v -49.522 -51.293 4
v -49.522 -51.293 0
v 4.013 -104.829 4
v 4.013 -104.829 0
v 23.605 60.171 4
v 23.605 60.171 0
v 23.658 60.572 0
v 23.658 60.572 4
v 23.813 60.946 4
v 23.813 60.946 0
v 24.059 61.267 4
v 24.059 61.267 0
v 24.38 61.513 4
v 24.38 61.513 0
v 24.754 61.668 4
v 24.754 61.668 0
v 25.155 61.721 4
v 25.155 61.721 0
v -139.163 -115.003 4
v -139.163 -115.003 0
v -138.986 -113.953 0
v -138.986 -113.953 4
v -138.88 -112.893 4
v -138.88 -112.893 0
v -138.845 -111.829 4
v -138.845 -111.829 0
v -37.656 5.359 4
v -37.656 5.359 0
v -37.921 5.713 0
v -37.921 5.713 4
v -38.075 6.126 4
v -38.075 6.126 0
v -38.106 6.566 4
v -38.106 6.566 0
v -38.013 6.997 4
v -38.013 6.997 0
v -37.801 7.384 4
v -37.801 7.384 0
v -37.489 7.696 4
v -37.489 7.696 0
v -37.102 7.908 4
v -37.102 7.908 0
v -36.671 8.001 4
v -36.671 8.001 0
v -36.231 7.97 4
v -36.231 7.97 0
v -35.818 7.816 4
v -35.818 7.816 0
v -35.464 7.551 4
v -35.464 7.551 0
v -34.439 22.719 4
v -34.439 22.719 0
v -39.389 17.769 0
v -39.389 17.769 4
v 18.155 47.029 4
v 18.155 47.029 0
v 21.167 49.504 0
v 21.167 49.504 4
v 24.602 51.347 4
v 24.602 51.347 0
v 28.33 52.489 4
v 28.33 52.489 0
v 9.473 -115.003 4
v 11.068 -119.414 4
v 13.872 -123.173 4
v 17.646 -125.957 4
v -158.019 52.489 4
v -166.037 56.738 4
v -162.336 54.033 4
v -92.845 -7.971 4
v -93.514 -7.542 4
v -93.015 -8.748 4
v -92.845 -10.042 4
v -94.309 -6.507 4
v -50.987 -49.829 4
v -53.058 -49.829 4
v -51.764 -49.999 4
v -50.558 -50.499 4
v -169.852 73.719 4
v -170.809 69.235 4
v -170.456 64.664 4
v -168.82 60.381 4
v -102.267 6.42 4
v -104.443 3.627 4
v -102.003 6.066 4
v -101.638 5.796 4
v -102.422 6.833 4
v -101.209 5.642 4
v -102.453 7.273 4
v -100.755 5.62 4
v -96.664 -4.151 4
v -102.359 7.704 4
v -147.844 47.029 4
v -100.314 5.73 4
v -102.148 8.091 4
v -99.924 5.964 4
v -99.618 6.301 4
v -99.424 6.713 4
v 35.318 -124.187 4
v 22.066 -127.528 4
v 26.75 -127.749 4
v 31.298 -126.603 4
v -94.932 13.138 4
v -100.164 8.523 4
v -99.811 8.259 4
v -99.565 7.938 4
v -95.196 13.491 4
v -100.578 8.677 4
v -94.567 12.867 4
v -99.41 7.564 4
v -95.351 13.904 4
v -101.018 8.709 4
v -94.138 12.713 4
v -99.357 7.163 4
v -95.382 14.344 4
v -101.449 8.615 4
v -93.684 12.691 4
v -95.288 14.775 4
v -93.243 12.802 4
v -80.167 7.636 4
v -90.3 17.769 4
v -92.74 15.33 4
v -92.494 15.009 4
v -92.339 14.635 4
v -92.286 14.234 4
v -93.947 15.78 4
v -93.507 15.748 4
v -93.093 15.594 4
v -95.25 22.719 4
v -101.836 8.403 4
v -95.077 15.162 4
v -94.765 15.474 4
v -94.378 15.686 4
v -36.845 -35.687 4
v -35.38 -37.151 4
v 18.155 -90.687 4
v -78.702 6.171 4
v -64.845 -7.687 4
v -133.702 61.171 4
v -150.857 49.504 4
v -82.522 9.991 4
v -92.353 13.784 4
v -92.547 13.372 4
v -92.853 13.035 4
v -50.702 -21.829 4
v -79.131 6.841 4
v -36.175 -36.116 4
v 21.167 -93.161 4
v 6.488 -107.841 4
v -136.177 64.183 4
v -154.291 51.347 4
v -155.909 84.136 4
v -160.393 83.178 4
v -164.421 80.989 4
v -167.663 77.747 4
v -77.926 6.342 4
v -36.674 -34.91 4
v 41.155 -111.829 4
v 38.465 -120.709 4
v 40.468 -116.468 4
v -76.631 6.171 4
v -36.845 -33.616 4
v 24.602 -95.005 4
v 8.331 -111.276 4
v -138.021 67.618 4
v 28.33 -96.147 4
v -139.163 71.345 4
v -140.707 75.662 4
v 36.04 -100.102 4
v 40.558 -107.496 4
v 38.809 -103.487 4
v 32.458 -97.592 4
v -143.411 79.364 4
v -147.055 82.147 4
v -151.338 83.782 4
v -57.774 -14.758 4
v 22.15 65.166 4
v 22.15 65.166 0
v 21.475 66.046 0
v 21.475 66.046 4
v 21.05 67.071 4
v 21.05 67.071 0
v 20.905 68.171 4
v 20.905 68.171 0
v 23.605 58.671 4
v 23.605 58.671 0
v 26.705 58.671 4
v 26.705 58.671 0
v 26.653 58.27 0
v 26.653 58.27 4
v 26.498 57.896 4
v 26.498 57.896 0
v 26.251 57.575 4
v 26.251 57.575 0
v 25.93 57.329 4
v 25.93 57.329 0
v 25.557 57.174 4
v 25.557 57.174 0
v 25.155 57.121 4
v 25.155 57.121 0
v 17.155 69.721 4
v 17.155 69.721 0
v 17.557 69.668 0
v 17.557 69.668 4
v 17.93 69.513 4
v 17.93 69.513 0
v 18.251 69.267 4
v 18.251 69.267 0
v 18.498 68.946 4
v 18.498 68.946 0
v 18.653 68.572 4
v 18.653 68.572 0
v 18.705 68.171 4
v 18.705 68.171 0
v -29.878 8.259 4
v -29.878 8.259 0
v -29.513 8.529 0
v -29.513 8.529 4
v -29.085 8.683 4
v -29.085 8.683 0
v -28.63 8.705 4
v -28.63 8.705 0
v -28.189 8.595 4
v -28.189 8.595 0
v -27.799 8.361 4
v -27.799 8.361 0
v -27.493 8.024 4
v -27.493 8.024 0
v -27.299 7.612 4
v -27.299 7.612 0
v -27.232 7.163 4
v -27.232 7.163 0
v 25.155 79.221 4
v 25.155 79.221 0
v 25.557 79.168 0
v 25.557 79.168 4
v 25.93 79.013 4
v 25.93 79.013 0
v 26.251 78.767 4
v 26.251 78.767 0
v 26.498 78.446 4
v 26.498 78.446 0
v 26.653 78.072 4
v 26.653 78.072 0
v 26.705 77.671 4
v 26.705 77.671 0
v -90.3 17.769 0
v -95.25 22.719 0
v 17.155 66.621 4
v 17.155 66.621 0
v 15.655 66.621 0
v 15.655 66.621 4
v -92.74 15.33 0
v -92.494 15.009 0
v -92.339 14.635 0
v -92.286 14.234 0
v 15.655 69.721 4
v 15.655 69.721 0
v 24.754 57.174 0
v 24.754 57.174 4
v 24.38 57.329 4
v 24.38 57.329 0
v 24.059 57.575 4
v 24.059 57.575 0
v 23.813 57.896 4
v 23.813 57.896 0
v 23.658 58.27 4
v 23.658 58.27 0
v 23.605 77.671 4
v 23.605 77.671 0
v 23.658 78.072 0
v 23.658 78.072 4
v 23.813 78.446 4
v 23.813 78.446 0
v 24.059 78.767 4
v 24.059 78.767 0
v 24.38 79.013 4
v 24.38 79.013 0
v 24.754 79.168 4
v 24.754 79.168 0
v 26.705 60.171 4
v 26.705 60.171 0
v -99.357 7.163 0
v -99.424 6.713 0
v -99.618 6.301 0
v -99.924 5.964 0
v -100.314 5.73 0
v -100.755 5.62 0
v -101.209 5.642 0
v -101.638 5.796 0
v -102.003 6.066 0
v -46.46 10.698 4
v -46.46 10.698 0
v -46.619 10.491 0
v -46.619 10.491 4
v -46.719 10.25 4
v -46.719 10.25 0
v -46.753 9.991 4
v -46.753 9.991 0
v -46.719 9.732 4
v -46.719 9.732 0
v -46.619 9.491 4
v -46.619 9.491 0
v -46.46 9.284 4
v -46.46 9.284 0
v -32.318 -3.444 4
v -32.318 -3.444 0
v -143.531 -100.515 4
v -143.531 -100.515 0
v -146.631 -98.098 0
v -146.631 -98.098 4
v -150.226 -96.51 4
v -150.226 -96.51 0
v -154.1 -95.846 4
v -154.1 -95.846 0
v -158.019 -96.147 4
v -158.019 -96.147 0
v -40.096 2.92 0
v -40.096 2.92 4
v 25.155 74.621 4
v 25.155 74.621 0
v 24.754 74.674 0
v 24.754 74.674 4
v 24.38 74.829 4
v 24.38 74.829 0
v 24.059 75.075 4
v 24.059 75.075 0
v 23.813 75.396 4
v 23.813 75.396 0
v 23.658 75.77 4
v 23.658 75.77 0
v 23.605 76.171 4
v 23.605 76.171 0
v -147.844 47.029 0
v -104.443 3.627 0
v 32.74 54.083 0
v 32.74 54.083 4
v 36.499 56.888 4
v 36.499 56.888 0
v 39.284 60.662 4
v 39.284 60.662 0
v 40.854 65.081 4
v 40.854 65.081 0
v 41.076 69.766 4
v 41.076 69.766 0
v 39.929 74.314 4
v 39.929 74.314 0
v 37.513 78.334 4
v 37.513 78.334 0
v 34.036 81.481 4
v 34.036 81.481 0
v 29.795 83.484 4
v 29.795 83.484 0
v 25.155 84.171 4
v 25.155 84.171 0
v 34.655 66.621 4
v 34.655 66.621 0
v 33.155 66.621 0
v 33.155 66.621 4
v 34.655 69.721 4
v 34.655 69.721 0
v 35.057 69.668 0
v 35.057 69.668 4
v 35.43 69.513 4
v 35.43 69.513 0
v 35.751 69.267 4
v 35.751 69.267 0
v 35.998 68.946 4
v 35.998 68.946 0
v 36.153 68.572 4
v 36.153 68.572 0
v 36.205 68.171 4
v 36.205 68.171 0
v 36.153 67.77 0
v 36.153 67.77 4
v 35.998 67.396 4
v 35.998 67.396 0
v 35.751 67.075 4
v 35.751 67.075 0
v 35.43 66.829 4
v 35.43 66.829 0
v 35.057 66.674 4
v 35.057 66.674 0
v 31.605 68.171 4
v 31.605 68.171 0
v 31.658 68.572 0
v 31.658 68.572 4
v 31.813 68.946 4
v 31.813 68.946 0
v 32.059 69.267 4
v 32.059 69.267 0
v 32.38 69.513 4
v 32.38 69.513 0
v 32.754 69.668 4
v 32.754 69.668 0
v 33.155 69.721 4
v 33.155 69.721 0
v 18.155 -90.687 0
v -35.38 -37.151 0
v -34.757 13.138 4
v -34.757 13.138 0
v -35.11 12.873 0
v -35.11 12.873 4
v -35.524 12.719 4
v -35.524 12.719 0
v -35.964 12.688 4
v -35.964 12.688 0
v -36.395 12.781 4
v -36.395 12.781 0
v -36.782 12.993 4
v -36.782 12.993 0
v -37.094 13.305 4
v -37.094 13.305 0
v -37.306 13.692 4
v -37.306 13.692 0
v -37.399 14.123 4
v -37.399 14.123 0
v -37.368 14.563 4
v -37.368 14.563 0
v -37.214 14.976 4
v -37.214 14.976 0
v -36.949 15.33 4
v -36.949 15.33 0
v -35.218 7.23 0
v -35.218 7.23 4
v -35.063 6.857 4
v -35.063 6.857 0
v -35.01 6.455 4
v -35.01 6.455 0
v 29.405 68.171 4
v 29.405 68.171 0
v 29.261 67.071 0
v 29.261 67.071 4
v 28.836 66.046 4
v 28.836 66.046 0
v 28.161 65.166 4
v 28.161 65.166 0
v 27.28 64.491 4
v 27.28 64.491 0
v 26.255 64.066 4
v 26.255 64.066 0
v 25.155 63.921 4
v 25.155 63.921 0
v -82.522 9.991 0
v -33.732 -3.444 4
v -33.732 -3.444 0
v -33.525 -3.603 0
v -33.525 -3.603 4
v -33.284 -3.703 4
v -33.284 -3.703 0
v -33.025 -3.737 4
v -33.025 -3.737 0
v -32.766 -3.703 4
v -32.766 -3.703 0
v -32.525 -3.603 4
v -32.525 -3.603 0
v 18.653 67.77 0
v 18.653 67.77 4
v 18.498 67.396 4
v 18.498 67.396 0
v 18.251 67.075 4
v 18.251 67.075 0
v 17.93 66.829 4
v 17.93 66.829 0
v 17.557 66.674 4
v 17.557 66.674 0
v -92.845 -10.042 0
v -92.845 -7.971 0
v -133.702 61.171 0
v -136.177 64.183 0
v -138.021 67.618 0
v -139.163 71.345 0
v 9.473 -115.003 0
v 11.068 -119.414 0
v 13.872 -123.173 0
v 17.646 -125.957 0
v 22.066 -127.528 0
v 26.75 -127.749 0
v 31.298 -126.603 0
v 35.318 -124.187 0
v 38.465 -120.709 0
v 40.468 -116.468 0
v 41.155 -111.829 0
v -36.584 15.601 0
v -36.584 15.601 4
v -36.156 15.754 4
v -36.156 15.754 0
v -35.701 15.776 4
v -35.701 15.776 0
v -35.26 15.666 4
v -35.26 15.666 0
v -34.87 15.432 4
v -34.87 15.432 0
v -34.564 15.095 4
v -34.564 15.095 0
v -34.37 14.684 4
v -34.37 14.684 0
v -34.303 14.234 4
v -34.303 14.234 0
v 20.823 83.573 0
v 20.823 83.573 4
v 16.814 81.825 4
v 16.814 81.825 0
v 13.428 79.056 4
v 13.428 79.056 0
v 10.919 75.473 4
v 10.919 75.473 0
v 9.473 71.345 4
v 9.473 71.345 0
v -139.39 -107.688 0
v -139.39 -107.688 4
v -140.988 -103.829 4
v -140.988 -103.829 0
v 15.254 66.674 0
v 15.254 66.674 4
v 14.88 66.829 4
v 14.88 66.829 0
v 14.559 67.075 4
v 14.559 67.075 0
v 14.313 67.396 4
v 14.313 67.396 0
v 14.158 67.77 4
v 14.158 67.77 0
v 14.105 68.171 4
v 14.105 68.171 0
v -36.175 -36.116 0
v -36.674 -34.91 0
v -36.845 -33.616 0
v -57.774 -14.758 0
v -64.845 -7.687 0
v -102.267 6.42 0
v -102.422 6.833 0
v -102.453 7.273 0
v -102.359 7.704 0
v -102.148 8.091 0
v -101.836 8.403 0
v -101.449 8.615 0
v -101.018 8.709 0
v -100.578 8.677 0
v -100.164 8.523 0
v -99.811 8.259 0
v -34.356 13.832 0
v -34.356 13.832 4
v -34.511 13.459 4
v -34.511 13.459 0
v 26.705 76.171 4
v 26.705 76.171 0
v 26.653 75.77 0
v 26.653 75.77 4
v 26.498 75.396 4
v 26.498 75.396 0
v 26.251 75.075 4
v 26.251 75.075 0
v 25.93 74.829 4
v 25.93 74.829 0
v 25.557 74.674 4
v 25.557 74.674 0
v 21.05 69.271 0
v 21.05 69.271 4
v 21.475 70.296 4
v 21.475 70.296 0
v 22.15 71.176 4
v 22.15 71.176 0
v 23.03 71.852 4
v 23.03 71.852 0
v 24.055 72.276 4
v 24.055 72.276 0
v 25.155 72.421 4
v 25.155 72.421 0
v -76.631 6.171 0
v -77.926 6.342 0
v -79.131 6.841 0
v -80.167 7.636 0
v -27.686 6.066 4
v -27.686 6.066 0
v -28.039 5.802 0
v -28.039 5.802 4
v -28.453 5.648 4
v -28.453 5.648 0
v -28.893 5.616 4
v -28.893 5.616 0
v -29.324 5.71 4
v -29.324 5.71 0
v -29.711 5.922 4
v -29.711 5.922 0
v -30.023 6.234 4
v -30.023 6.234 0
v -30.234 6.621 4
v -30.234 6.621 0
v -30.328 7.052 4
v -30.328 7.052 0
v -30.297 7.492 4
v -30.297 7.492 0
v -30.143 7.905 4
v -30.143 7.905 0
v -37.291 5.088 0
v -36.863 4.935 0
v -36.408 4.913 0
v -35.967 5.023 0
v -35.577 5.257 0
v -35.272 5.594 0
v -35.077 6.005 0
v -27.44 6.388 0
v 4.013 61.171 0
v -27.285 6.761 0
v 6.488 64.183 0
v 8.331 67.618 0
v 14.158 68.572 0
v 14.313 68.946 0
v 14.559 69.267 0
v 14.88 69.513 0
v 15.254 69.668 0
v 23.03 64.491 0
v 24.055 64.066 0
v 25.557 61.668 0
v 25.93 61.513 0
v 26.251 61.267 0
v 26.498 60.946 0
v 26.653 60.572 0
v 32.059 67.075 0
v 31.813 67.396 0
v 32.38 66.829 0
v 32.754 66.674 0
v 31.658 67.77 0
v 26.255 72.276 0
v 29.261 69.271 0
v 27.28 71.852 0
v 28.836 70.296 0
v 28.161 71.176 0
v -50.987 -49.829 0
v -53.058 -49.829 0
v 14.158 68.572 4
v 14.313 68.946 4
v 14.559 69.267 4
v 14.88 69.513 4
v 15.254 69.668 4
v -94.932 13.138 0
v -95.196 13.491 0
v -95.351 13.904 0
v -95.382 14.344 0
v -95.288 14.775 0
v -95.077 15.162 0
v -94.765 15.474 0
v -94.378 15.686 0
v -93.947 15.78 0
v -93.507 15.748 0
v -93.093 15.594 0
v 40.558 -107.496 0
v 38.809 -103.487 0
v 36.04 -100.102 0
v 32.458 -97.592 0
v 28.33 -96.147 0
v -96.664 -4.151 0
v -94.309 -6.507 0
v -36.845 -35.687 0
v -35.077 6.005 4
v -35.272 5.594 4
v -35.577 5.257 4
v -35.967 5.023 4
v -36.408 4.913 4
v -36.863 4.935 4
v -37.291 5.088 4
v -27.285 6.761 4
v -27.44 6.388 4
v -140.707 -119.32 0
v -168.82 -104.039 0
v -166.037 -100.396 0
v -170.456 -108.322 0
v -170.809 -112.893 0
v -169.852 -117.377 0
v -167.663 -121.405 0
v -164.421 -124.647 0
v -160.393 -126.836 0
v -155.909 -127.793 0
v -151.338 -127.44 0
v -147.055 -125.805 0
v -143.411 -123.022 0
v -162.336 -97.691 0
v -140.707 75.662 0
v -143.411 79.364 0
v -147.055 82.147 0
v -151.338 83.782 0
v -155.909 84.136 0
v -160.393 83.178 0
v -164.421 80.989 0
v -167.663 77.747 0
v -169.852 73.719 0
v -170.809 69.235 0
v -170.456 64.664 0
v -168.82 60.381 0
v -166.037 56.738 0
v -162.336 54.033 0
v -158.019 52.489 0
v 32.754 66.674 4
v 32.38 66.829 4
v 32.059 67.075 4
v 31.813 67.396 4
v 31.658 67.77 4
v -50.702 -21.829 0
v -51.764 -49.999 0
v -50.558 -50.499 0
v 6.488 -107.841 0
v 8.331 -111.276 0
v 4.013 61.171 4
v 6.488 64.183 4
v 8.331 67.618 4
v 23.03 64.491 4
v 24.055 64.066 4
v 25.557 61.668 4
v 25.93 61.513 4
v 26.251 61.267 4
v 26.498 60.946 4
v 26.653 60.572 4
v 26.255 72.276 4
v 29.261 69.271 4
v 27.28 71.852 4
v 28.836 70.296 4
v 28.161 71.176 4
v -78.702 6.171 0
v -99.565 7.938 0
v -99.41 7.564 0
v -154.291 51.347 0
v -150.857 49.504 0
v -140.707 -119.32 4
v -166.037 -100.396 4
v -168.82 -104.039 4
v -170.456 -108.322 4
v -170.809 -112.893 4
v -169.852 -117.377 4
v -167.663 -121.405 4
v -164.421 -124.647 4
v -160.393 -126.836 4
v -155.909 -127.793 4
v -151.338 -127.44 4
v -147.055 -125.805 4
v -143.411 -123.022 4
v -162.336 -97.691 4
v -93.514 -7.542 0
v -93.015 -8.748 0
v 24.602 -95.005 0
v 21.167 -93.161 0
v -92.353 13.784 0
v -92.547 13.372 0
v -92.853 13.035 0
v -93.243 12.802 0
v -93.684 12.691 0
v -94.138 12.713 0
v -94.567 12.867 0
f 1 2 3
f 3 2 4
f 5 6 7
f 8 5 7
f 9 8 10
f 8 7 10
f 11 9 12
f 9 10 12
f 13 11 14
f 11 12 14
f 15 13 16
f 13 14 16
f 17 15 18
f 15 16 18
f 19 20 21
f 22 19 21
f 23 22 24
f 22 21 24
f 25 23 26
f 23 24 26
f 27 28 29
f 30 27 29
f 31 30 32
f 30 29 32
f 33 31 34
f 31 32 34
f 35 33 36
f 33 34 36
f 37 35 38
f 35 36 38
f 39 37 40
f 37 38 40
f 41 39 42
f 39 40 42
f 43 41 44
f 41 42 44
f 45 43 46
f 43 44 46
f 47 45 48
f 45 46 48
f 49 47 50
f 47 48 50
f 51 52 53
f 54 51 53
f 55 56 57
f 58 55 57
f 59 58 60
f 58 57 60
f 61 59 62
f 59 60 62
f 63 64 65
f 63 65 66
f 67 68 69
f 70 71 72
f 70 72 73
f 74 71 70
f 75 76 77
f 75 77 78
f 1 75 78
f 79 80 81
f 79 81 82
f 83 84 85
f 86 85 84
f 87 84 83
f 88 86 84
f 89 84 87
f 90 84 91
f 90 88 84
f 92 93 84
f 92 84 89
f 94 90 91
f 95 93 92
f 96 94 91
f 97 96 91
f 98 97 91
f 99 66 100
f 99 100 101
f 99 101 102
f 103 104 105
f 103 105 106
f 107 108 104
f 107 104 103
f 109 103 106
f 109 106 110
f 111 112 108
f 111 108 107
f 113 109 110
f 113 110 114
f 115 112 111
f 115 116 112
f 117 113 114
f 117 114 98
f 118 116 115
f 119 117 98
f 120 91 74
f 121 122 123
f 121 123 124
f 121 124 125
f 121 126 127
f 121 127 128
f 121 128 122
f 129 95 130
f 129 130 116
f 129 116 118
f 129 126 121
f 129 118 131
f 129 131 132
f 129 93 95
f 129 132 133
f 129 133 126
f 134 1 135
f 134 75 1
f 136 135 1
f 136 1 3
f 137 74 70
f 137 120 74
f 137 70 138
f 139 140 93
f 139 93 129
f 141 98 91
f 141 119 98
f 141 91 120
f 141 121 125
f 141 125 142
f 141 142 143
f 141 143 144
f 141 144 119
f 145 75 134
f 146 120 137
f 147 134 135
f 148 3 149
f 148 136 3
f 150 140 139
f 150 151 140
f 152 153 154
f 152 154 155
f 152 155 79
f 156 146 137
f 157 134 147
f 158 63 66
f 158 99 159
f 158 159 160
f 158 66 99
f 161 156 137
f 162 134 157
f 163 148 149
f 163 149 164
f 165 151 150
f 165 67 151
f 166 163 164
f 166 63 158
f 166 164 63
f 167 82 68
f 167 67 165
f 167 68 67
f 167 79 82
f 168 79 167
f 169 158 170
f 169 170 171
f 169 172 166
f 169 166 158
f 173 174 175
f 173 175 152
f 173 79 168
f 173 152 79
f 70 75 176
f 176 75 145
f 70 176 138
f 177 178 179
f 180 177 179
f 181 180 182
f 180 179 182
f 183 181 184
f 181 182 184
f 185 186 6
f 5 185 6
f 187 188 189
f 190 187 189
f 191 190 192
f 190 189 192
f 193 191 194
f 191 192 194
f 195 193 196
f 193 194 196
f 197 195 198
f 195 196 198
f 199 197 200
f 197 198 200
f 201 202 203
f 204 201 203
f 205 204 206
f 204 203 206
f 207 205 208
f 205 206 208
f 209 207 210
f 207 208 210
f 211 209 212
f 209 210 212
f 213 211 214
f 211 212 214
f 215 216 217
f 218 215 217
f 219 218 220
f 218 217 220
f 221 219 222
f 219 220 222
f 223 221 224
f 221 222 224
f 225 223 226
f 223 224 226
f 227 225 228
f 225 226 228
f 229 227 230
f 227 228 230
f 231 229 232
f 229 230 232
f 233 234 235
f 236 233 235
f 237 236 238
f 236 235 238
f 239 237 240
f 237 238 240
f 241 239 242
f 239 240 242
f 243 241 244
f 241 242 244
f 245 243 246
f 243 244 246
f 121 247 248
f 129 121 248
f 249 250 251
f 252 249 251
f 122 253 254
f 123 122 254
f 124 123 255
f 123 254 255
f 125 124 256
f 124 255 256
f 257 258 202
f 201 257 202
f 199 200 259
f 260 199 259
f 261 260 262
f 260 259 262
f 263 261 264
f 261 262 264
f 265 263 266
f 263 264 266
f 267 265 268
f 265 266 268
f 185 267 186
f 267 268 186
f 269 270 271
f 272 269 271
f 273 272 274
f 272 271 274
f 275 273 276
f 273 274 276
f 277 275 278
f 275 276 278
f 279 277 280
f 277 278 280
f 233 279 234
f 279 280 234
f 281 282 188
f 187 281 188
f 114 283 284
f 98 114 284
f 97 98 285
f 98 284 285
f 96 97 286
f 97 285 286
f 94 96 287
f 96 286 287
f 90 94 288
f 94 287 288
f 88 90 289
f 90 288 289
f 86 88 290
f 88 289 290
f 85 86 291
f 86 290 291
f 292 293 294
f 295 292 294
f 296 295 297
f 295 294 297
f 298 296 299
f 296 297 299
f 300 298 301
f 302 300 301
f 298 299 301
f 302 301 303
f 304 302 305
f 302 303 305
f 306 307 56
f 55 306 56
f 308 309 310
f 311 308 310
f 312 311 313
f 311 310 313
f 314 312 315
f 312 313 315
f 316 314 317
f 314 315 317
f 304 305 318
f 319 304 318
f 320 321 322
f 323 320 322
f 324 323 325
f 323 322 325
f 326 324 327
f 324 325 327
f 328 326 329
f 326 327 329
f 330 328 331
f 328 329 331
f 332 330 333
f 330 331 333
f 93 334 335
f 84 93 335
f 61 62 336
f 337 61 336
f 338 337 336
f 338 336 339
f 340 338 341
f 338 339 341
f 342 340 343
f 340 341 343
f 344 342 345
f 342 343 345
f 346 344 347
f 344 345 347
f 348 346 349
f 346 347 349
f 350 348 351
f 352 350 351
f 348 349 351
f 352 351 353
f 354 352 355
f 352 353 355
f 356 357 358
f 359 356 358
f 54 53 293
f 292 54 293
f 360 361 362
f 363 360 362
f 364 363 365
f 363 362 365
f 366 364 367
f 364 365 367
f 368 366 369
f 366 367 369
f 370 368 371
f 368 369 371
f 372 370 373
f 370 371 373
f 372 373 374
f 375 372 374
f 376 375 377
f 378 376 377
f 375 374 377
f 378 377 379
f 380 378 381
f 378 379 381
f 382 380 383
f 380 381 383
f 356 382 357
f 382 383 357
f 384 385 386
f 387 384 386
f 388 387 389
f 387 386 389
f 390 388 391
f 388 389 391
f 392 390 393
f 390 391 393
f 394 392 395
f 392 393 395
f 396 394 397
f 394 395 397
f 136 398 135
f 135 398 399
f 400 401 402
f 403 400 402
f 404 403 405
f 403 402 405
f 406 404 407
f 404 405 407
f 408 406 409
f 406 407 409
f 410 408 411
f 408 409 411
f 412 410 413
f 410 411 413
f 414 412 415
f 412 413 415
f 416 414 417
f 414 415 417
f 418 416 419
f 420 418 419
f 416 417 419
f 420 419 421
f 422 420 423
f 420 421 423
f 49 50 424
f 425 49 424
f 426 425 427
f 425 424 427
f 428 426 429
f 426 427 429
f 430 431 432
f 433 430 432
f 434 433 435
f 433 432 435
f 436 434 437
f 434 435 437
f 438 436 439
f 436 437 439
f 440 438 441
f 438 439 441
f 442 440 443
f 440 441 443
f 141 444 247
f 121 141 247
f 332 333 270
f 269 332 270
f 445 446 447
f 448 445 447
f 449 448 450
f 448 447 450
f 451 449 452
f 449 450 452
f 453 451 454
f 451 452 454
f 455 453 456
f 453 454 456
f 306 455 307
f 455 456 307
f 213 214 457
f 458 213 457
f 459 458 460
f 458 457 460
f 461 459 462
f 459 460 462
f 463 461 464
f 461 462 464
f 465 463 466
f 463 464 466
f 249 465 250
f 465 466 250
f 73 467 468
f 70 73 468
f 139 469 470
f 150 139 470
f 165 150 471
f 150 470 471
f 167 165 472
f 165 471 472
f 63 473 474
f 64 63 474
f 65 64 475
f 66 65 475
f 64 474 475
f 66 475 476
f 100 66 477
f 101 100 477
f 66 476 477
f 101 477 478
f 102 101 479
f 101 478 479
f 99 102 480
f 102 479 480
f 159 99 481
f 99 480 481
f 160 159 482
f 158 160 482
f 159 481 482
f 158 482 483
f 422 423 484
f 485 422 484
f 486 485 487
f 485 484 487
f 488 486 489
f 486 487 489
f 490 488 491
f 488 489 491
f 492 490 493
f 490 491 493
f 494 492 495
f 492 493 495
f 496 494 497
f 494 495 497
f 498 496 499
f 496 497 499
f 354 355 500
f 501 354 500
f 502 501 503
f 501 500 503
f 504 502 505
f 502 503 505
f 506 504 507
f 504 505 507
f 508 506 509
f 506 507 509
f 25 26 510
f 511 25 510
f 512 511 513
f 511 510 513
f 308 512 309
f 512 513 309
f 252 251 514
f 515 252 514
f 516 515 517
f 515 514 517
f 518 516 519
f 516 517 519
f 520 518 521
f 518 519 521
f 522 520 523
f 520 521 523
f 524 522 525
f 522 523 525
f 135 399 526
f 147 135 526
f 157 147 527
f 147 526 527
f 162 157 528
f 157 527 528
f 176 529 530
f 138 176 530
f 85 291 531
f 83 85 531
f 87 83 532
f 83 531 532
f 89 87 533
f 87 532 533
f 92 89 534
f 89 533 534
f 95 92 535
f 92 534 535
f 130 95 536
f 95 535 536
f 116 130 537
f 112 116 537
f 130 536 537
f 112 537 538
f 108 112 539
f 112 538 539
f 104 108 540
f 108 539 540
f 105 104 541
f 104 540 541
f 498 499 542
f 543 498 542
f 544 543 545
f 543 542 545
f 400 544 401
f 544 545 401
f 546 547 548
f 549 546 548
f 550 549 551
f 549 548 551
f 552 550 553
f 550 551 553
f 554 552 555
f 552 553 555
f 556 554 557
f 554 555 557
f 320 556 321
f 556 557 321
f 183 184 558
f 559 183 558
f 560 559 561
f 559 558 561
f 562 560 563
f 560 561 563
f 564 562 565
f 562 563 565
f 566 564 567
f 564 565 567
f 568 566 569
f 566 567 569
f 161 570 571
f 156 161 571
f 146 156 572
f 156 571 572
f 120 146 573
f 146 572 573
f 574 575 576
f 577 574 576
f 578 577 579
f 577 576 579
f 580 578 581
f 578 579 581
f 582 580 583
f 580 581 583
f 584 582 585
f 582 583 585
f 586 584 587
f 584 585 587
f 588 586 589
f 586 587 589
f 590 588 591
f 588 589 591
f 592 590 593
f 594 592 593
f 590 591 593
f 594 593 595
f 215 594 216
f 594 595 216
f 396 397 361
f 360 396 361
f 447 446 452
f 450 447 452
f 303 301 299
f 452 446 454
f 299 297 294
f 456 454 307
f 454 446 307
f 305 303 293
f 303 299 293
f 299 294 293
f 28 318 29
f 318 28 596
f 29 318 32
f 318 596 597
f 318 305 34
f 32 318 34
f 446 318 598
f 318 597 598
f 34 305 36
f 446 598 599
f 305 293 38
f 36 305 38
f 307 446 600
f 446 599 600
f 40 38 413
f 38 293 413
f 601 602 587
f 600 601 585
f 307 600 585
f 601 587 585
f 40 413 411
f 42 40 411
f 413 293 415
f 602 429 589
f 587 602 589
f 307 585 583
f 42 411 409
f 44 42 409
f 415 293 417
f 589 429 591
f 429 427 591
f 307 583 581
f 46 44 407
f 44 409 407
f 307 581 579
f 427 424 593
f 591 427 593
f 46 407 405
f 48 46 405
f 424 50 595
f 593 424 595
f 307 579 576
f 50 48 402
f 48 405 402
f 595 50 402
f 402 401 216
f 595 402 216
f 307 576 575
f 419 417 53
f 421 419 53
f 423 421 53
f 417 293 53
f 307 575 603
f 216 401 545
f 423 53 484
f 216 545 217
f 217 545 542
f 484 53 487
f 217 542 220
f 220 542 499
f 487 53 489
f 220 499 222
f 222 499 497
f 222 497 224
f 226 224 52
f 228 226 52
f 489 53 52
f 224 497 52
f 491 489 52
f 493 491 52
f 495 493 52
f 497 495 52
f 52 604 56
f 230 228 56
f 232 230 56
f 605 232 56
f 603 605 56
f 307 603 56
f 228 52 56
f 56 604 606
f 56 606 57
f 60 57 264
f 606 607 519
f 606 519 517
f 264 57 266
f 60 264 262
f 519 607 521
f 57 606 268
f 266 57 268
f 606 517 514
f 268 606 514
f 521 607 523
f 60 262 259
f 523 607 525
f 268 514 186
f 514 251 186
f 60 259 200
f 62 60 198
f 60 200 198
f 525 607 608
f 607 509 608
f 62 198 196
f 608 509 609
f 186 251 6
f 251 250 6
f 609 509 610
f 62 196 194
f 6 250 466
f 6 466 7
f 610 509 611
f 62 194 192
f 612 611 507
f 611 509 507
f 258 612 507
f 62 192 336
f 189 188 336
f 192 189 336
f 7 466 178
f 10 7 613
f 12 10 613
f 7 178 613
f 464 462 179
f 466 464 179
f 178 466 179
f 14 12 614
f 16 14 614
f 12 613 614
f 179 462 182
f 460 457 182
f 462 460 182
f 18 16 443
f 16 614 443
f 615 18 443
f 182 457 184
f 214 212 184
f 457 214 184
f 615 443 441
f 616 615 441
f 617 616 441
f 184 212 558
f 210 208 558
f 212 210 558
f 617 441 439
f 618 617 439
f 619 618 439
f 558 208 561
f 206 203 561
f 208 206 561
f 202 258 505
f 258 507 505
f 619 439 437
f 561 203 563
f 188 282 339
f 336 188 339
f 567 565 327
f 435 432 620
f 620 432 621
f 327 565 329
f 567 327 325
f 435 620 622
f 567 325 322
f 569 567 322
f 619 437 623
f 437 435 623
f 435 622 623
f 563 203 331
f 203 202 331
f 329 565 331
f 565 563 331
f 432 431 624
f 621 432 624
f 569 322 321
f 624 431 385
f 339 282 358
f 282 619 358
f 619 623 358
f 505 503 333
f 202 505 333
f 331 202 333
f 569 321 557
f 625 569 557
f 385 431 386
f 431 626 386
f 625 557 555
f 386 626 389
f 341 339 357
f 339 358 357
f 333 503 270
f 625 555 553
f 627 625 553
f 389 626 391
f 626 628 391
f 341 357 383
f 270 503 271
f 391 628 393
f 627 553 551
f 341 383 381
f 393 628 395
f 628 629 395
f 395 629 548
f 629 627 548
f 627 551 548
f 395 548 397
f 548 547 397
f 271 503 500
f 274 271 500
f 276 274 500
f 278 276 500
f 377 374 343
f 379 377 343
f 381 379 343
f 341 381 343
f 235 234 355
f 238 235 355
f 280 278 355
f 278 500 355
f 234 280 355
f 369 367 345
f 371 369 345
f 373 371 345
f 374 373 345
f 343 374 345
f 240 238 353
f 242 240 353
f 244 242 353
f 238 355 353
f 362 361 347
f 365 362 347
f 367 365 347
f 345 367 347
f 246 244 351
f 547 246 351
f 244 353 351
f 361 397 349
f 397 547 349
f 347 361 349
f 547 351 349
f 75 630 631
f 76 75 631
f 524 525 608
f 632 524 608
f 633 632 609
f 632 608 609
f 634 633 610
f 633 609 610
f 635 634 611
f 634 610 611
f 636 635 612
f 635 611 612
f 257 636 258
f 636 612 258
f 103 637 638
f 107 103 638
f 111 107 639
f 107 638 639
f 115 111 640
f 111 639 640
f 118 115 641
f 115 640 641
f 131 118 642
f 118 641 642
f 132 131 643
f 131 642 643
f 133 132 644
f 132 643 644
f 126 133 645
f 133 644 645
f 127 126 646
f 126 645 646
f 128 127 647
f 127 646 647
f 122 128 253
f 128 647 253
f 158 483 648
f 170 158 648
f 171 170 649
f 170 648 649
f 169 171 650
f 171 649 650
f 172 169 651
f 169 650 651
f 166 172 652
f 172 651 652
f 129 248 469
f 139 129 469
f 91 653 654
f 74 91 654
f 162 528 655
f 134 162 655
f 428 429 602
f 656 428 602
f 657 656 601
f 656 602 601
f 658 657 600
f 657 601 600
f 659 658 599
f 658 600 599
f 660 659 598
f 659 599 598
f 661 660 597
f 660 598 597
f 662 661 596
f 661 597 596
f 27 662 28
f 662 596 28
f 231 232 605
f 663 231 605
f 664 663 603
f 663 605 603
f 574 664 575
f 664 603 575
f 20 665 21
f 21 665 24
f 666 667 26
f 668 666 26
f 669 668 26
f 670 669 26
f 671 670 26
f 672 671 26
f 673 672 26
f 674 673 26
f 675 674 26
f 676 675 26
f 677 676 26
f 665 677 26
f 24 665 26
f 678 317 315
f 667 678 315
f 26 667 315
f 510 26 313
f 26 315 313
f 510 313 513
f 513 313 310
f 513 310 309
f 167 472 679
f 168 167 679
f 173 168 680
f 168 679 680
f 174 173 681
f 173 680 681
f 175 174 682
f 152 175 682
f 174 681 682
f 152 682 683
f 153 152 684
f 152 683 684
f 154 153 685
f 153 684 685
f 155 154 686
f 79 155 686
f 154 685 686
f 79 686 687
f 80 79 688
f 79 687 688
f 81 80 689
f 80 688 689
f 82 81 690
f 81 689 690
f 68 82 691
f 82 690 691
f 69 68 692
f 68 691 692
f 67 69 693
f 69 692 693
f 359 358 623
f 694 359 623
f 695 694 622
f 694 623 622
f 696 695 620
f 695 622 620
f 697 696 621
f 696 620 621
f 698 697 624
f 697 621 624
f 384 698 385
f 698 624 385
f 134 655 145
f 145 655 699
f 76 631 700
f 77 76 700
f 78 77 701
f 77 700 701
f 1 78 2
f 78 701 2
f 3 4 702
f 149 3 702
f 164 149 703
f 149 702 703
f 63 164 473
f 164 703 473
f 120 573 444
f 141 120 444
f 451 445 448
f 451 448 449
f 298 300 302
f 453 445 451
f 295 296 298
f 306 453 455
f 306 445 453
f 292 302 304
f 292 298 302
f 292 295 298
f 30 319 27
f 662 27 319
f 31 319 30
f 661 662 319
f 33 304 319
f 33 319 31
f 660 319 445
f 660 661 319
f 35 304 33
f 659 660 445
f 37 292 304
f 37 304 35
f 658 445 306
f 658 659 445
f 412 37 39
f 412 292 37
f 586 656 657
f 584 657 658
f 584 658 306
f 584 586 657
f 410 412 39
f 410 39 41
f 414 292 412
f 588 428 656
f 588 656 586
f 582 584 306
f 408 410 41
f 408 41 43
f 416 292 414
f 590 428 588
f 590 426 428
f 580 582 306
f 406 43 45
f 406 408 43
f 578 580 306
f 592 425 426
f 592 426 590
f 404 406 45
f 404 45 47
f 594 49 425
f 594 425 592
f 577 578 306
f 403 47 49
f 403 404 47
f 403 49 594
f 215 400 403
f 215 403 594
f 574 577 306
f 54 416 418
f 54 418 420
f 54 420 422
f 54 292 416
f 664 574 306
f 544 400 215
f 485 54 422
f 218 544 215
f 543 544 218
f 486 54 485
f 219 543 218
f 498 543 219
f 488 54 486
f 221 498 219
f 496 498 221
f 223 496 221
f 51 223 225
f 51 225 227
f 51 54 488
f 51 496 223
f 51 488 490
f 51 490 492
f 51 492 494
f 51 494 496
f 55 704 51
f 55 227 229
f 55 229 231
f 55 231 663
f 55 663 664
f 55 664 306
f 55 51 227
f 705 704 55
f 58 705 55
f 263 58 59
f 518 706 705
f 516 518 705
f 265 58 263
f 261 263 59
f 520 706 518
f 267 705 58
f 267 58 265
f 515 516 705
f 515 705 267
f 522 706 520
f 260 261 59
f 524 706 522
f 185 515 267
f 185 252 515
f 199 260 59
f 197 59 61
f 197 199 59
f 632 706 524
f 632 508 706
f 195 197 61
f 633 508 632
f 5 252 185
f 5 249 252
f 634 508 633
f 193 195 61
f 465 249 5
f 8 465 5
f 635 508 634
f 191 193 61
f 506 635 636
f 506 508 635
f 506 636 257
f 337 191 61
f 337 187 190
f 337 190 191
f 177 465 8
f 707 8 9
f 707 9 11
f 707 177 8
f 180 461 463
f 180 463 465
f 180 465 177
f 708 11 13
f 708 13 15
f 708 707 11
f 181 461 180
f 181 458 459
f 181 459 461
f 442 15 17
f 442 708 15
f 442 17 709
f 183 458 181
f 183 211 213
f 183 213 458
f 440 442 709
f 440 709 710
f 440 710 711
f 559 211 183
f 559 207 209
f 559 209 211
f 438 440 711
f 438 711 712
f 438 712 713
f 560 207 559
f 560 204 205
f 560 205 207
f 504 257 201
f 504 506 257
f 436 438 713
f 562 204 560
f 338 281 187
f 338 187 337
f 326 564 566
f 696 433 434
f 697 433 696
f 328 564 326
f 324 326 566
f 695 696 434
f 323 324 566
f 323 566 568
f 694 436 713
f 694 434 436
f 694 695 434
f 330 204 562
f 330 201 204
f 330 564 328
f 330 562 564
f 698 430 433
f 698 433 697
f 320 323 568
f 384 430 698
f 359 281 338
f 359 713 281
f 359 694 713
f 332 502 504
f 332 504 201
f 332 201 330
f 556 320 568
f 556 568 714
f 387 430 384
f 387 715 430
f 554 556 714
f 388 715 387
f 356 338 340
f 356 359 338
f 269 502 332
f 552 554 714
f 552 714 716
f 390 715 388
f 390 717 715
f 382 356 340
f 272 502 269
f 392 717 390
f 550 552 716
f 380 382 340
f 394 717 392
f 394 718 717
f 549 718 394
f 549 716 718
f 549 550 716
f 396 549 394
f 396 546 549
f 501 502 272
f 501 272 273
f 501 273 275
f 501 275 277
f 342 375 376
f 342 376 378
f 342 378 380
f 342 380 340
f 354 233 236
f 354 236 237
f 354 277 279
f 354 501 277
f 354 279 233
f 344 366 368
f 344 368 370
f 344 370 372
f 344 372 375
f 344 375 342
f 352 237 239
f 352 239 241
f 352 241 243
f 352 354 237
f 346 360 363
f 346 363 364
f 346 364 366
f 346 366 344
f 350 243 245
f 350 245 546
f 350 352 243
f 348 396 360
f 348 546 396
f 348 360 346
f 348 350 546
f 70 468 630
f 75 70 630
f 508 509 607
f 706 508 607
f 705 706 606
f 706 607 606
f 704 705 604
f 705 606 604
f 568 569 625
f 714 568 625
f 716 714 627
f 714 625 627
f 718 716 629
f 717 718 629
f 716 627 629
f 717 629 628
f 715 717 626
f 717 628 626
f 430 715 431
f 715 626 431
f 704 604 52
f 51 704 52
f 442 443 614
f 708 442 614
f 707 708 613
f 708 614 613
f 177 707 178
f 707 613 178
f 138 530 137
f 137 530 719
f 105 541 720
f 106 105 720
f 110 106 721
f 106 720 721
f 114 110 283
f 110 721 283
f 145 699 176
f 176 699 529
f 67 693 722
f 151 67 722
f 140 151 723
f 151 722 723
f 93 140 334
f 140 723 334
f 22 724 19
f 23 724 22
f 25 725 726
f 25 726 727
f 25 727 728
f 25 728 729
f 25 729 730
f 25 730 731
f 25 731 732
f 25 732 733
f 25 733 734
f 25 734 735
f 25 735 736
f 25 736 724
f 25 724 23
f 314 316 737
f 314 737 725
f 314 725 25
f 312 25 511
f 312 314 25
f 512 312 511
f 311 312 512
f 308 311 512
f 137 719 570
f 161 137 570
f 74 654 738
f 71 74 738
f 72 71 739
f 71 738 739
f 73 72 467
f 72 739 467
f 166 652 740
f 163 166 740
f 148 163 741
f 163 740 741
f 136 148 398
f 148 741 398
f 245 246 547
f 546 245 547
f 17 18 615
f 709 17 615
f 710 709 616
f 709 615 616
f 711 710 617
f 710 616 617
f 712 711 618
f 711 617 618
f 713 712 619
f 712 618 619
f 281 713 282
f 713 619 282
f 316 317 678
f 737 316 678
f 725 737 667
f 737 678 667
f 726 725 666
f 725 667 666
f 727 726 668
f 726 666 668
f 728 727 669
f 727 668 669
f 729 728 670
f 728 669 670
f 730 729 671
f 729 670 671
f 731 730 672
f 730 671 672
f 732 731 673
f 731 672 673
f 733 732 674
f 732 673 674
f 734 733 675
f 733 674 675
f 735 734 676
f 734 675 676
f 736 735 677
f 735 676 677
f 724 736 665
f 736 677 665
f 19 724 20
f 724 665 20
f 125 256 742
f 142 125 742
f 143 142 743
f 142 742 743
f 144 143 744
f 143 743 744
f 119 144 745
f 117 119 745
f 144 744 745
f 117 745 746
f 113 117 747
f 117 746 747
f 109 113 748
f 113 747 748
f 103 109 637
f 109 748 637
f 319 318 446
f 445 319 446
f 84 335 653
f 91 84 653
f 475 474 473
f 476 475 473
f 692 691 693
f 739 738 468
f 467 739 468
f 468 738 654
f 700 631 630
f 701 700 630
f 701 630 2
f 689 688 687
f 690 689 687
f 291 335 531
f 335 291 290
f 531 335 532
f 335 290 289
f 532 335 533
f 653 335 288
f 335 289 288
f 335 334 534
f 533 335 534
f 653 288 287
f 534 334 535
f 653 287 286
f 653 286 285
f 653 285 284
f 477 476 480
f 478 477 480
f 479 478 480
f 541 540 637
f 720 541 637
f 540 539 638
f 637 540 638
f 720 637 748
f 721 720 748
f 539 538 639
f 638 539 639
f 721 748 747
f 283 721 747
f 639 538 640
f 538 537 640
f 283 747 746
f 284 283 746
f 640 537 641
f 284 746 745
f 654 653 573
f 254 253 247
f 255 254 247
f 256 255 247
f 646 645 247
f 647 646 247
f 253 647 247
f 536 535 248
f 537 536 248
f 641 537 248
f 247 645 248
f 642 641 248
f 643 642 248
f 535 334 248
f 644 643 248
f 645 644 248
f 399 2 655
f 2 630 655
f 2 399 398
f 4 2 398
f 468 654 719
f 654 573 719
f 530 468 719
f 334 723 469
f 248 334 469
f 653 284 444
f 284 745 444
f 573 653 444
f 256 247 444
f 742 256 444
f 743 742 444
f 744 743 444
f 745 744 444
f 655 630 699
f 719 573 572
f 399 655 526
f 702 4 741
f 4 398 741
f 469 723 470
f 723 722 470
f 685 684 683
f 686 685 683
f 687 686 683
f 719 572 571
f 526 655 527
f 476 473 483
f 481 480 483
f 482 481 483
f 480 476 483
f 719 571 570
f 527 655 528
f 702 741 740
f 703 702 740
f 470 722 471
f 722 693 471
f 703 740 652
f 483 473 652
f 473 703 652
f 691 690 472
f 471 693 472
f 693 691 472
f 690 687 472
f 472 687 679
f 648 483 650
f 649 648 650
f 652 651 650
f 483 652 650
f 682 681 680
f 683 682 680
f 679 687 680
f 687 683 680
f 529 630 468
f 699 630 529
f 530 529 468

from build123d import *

# Parameters (mm, degrees)
F1_DEPTH = 4


# Not quite as in the source:
# - a feature names something its author has since deleted; it is built from what else it names


with BuildPart() as f1:
    # F0 (on Top) → F1 (new body)
    with BuildSketch(Plane.XY):
        with BuildLine():
            Line((36.2053791718, 68.1711297919), (41.1553791718, 68.1711297919))
            ThreePointArc((41.1553791718, 68.1711297919), (36.4690876708, 79.4848382909), (25.1553791718, 84.1711297919))
            Line((25.1553791718, 84.1711297919), (25.1553791718, 79.2211297919))
            ThreePointArc((25.1553791718, 79.2211297919), (26.2513946827, 78.7671453027), (26.7053791718, 77.6711297919))
            Line((26.7053791718, 77.6711297919), (26.7053791718, 76.1711297919))
            ThreePointArc((26.7053791718, 76.1711297919), (26.2513946827, 75.075114281), (25.1553791718, 74.6211297919))
            Line((25.1553791718, 74.6211297919), (25.1553791718, 72.4211297919))
            ThreePointArc((25.1553791718, 72.4211297919), (28.1605829919, 71.1763336119), (29.4053791718, 68.1711297919))
            Line((29.4053791718, 68.1711297919), (31.6053791718, 68.1711297919))
            ThreePointArc((31.6053791718, 68.1711297919), (32.059363661, 69.2671453027), (33.1553791718, 69.7211297919))
            Line((33.1553791718, 69.7211297919), (34.6553791718, 69.7211297919))
            ThreePointArc((34.6553791718, 69.7211297919), (35.7513946827, 69.2671453027), (36.2053791718, 68.1711297919))
        make_face()
        with BuildLine():
            ThreePointArc((28.3295819531, 52.4891517054), (37.5405970645, 58.041649166), (41.1553791718, 68.1711297919))
            Line((41.1553791718, 68.1711297919), (36.2053791718, 68.1711297919))
            ThreePointArc((36.2053791718, 68.1711297919), (35.7513946827, 67.075114281), (34.6553791718, 66.6211297919))
            Line((34.6553791718, 66.6211297919), (33.1553791718, 66.6211297919))
            ThreePointArc((33.1553791718, 66.6211297919), (32.059363661, 67.075114281), (31.6053791718, 68.1711297919))
            Line((31.6053791718, 68.1711297919), (29.4053791718, 68.1711297919))
            ThreePointArc((29.4053791718, 68.1711297919), (28.1605829919, 65.1659259718), (25.1553791718, 63.9211297919))
            Line((25.1553791718, 63.9211297919), (25.1553791718, 61.7211297919))
            ThreePointArc((25.1553791718, 61.7211297919), (26.2513946827, 61.2671453027), (26.7053791718, 60.1711297919))
            Line((26.7053791718, 60.1711297919), (26.7053791718, 58.6711297919))
            ThreePointArc((26.7053791718, 58.6711297919), (26.2513946827, 57.575114281), (25.1553791718, 57.1211297919))
            Line((25.1553791718, 57.1211297919), (25.1553791718, 52.1711297919))
            ThreePointArc((25.1553791718, 52.1711297919), (26.7504262898, 52.250833793), (28.3295819531, 52.4891517054))
        make_face()
        with BuildLine():
            Line((25.1553791718, 79.2211297919), (25.1553791718, 84.1711297919))
            ThreePointArc((25.1553791718, 84.1711297919), (15.0258985265, 80.5563476687), (9.4734010754, 71.3453325238))
            ThreePointArc((9.4734010754, 71.3453325238), (9.2350831705, 69.7661768848), (9.1553791718, 68.1711297919))
            Line((9.1553791718, 68.1711297919), (14.1053791718, 68.1711297919))
            ThreePointArc((14.1053791718, 68.1711297919), (14.559363661, 69.2671453027), (15.6553791718, 69.7211297919))
            Line((15.6553791718, 69.7211297919), (17.1553791718, 69.7211297919))
            ThreePointArc((17.1553791718, 69.7211297919), (18.2513946827, 69.2671453027), (18.7053791718, 68.1711297919))
            Line((18.7053791718, 68.1711297919), (20.9053791718, 68.1711297919))
            ThreePointArc((20.9053791718, 68.1711297919), (22.1501753518, 71.1763336119), (25.1553791718, 72.4211297919))
            Line((25.1553791718, 72.4211297919), (25.1553791718, 74.6211297919))
            ThreePointArc((25.1553791718, 74.6211297919), (24.059363661, 75.075114281), (23.6053791718, 76.1711297919))
            Line((23.6053791718, 76.1711297919), (23.6053791718, 77.6711297919))
            ThreePointArc((23.6053791718, 77.6711297919), (24.059363661, 78.7671453027), (25.1553791718, 79.2211297919))
        make_face()
        with BuildLine():
            ThreePointArc((18.1552000116, 47.0288150079), (22.8397544367, 50.5092261028), (28.3295819531, 52.4891517054))
            ThreePointArc((28.3295819531, 52.4891517054), (26.7504262898, 52.250833793), (25.1553791718, 52.1711297919))
            ThreePointArc((25.1553791718, 52.1711297919), (24.273692961, 52.1954410923), (23.3946861174, 52.2683011137))
            Line((23.3946861174, 52.2683011137), (18.1552000116, 47.0288150079))
        make_face()
        with BuildLine():
            ThreePointArc((9.1553791718, 68.1711297919), (9.2350831705, 69.7661768848), (9.4734010754, 71.3453325238))
            ThreePointArc((9.4734010754, 71.3453325238), (7.4934752577, 65.8555046373), (4.0130637502, 61.170949994))
            Line((4.0130637502, 61.170949994), (9.2525504936, 66.4104367374))
            ThreePointArc((9.2525504936, 66.4104367374), (9.1796904723, 67.289443581), (9.1553791718, 68.1711297919))
        make_face()
        with BuildLine():
            ThreePointArc((23.3946861174, 52.2683011137), (24.273692961, 52.1954410923), (25.1553791718, 52.1711297919))
            Line((25.1553791718, 52.1711297919), (25.1553791718, 57.1211297919))
            ThreePointArc((25.1553791718, 57.1211297919), (24.059363661, 57.575114281), (23.6053791718, 58.6711297919))
            Line((23.6053791718, 58.6711297919), (23.6053791718, 60.1711297919))
            ThreePointArc((23.6053791718, 60.1711297919), (24.059363661, 61.2671453027), (25.1553791718, 61.7211297919))
            Line((25.1553791718, 61.7211297919), (25.1553791718, 63.9211297919))
            ThreePointArc((25.1553791718, 63.9211297919), (23.5289745843, 64.2446417787), (22.1501753518, 65.1659259718))
            Line((22.1501753518, 65.1659259718), (13.8416706728, 56.8574212929))
            ThreePointArc((13.8416706728, 56.8574212929), (18.2271759416, 53.74892469), (23.3946861174, 52.2683011137))
        make_face()
        with BuildLine():
            Line((-20.2968936134, 8.5767213829), (18.1552000116, 47.0288150079))
            Line((18.1552000116, 47.0288150079), (23.3946861174, 52.2683011137))
            ThreePointArc((23.3946861174, 52.2683011137), (18.2271759416, 53.74892469), (13.8416706728, 56.8574212929))
            Line((13.8416706728, 56.8574212929), (-27.3679614253, 15.6477891948))
            Line((-27.3679614253, 15.6477891948), (-20.2968936134, 8.5767213829))
        make_face()
        with BuildLine():
            Line((14.1053791718, 68.1711297919), (9.1553791718, 68.1711297919))
            ThreePointArc((9.1553791718, 68.1711297919), (9.1796904723, 67.289443581), (9.2525504936, 66.4104367374))
            ThreePointArc((9.2525504936, 66.4104367374), (10.73317407, 61.2429265616), (13.8416706728, 56.8574212929))
            Line((13.8416706728, 56.8574212929), (22.1501753518, 65.1659259718))
            ThreePointArc((22.1501753518, 65.1659259718), (21.2288911587, 66.5447252043), (20.9053791718, 68.1711297919))
            Line((20.9053791718, 68.1711297919), (18.7053791718, 68.1711297919))
            ThreePointArc((18.7053791718, 68.1711297919), (18.2513946827, 67.075114281), (17.1553791718, 66.6211297919))
            Line((17.1553791718, 66.6211297919), (15.6553791718, 66.6211297919))
            ThreePointArc((15.6553791718, 66.6211297919), (14.559363661, 67.075114281), (14.1053791718, 68.1711297919))
        make_face()
        with BuildLine():
            Line((9.2525504936, 66.4104367374), (4.0130637502, 61.170949994))
            Line((4.0130637502, 61.170949994), (-34.4390292371, 22.7188570066))
            Line((-34.4390292371, 22.7188570066), (-27.3679614253, 15.6477891948))
            Line((-27.3679614253, 15.6477891948), (13.8416706728, 56.8574212929))
            ThreePointArc((13.8416706728, 56.8574212929), (10.73317407, 61.2429265616), (9.2525504936, 66.4104367374))
        make_face()
        with BuildLine():
            Line((-25.2466410817, 3.6269739146), (-20.2968936134, 8.5767213829))
            Line((-20.2968936134, 8.5767213829), (-27.3679614253, 15.6477891948))
            Line((-27.3679614253, 15.6477891948), (-32.3177088936, 10.6980417265))
            Line((-32.3177088936, 10.6980417265), (-29.8781904985, 8.2585233314))
            ThreePointArc((-29.8781904985, 8.2585233314), (-28.1890156675, 8.5945210959), (-27.2321749877, 7.1625078205))
            ThreePointArc((-27.2321749877, 7.1625078205), (-27.3501617123, 6.5693485004), (-27.6861594768, 6.0664923097))
            Line((-27.6861594768, 6.0664923097), (-25.2466410817, 3.6269739146))
        make_face()
        with BuildLine():
            Line((-27.3679614253, 15.6477891948), (-34.4390292371, 22.7188570066))
            Line((-34.4390292371, 22.7188570066), (-39.3887767054, 17.7691095383))
            Line((-39.3887767054, 17.7691095383), (-36.9492583104, 15.3295911432))
            ThreePointArc((-36.9492583104, 15.3295911432), (-35.2600834794, 15.6655889078), (-34.3032427995, 14.2335756324))
            ThreePointArc((-34.3032427995, 14.2335756324), (-34.4212295241, 13.6404163122), (-34.7572272887, 13.1375601216))
            Line((-34.7572272887, 13.1375601216), (-32.3177088936, 10.6980417265))
            Line((-32.3177088936, 10.6980417265), (-27.3679614253, 15.6477891948))
        make_face()
        with BuildLine():
            Line((-32.3177088936, -3.4440938973), (-25.2466410817, 3.6269739146))
            Line((-25.2466410817, 3.6269739146), (-27.6861594768, 6.0664923097))
            ThreePointArc((-27.6861594768, 6.0664923097), (-29.8781904985, 6.0664923097), (-29.8781904985, 8.2585233314))
            Line((-29.8781904985, 8.2585233314), (-32.3177088936, 10.6980417265))
            Line((-32.3177088936, 10.6980417265), (-35.4643340699, 7.5514165502))
            ThreePointArc((-35.4643340699, 7.5514165502), (-35.1283363053, 7.0485603595), (-35.0103495807, 6.4554010393))
            ThreePointArc((-35.0103495807, 6.4554010393), (-35.9671902605, 5.023387764), (-37.6563650915, 5.3593855285))
            Line((-37.6563650915, 5.3593855285), (-40.0958834866, 2.9198671334))
            Line((-40.0958834866, 2.9198671334), (-33.731922456, -3.4440938973))
            ThreePointArc((-33.731922456, -3.4440938973), (-33.0248156748, -3.7369871161), (-32.3177088936, -3.4440938973))
        make_face()
        with BuildLine():
            Line((-36.9492583104, 15.3295911432), (-39.3887767054, 17.7691095383))
            Line((-39.3887767054, 17.7691095383), (-46.4598445173, 10.6980417265))
            ThreePointArc((-46.4598445173, 10.6980417265), (-46.7527377361, 9.9909349453), (-46.4598445173, 9.2838281641))
            Line((-46.4598445173, 9.2838281641), (-40.0958834866, 2.9198671334))
            Line((-40.0958834866, 2.9198671334), (-37.6563650915, 5.3593855285))
            ThreePointArc((-37.6563650915, 5.3593855285), (-37.6563650915, 7.5514165502), (-35.4643340699, 7.5514165502))
            Line((-35.4643340699, 7.5514165502), (-32.3177088936, 10.6980417265))
            Line((-32.3177088936, 10.6980417265), (-34.7572272887, 13.1375601216))
            ThreePointArc((-34.7572272887, 13.1375601216), (-36.9492583104, 13.1375601216), (-36.9492583104, 15.3295911432))
        make_face()
    extrude(amount=F1_DEPTH)


with BuildPart() as f1b:
    # F0 (on Top) → F1, piece 2 (new body)
    with BuildSketch(Plane.XY):
        with BuildLine():
            ThreePointArc((-138.8446208282, -111.8288702081), (-140.062548308, -105.7059352903), (-143.5309123292, -100.5151617091))
            ThreePointArc((-143.5309123292, -100.5151617091), (-150.2258187408, -96.5100364641), (-158.0188236998, -96.14689214))
            ThreePointArc((-158.0188236998, -96.14689214), (-166.1583293272, -123.1425787071), (-139.16264276, -115.0030730797))
            ThreePointArc((-139.16264276, -115.0030730797), (-138.9243248339, -113.4239173719), (-138.8446208282, -111.8288702081))
        make_face()
    extrude(amount=F1_DEPTH)


with BuildPart() as f1c:
    # F0 (on Top) → F1, piece 3 (new body)
    with BuildSketch(Plane.XY):
        Polygon((-50.7024852044, -21.8288702081), (-57.7735530163, -14.7578023963), (-64.8446208282, -21.8288702081), align=None)
        Polygon((-64.8446208282, -21.8288702081), (-57.7735530163, -14.7578023963), (-64.8446208282, -7.6867345844), align=None)
        Polygon((-78.9867564519, -21.8288702081), (-64.8446208282, -21.8288702081), (-89.5933581697, 2.9198671334), (-96.6644259816, -4.1512006785), (-94.3090869492, -6.5065397108), (-92.8446208282, -7.9710058318), align=None)
        with BuildLine():
            Line((-50.7024852044, -21.8288702081), (-64.8446208282, -21.8288702081))
            Line((-64.8446208282, -21.8288702081), (13.8416706728, -100.5151617091))
            ThreePointArc((13.8416706728, -100.5151617091), (18.2271759416, -97.4066651063), (23.3946861174, -95.9260415299))
            Line((23.3946861174, -95.9260415299), (18.1551993662, -90.6865547787))
            Line((18.1551993662, -90.6865547787), (-35.3801547186, -37.151200694))
            Line((-35.3801547186, -37.151200694), (-36.8446208282, -35.6867345844))
            Line((-36.8446208282, -35.6867345844), (-50.7024852044, -21.8288702081))
        make_face()
        Polygon((-64.8446208282, -35.9710058318), (-64.8446208282, -21.8288702081), (-71.91568864, -28.89993802), align=None)
        Polygon((-89.5933581697, 2.9198671334), (-64.8446208282, -21.8288702081), (-64.8446208282, -7.6867345844), (-78.7024852044, 6.1711297919), (-80.1669513924, 7.6355959798), (-82.5222903578, 9.9909349453), align=None)
        with BuildLine():
            Line((13.8416706728, -100.5151617091), (-64.8446208282, -21.8288702081))
            Line((-64.8446208282, -21.8288702081), (-64.8446208282, -35.9710058318))
            Line((-64.8446208282, -35.9710058318), (-50.9867564519, -49.8288702081))
            Line((-50.9867564519, -49.8288702081), (-49.5222903639, -51.2933362961))
            Line((-49.5222903639, -51.2933362961), (4.0130642277, -104.8286908877))
            Line((4.0130642277, -104.8286908877), (9.2525504936, -110.0681771537))
            ThreePointArc((9.2525504936, -110.0681771537), (10.73317407, -104.9006669778), (13.8416706728, -100.5151617091))
        make_face()
        Polygon((-71.91568864, -28.89993802), (-64.8446208282, -21.8288702081), (-78.9867564519, -21.8288702081), align=None)
        with BuildLine():
            Line((-96.6644259816, -4.1512006785), (-89.5933581697, 2.9198671334))
            Line((-89.5933581697, 2.9198671334), (-92.0328765648, 5.3593855285))
            ThreePointArc((-92.0328765648, 5.3593855285), (-94.2249075865, 5.3593855285), (-94.2249075865, 7.5514165502))
            Line((-94.2249075865, 7.5514165502), (-97.3715327627, 10.6980417265))
            Line((-97.3715327627, 10.6980417265), (-99.8110511578, 8.2585233314))
            ThreePointArc((-99.8110511578, 8.2585233314), (-99.4750533933, 7.7556671407), (-99.3570666687, 7.1625078205))
            ThreePointArc((-99.3570666687, 7.1625078205), (-100.3139073485, 5.7304945451), (-102.0030821795, 6.0664923097))
            Line((-102.0030821795, 6.0664923097), (-104.4426005746, 3.6269739146))
            Line((-104.4426005746, 3.6269739146), (-96.6644259816, -4.1512006785))
        make_face()
        with BuildLine():
            Line((-92.0328765648, 5.3593855285), (-89.5933581697, 2.9198671334))
            Line((-89.5933581697, 2.9198671334), (-82.5222903578, 9.9909349453))
            Line((-82.5222903578, 9.9909349453), (-90.3004649509, 17.7691095383))
            Line((-90.3004649509, 17.7691095383), (-92.739983346, 15.3295911432))
            ThreePointArc((-92.739983346, 15.3295911432), (-92.4039855814, 14.8267349526), (-92.2859988568, 14.2335756324))
            ThreePointArc((-92.2859988568, 14.2335756324), (-93.2428395366, 12.801562357), (-94.9320143677, 13.1375601216))
            Line((-94.9320143677, 13.1375601216), (-97.3715327627, 10.6980417265))
            Line((-97.3715327627, 10.6980417265), (-94.2249075865, 7.5514165502))
            ThreePointArc((-94.2249075865, 7.5514165502), (-92.5357327555, 7.8874143147), (-91.5788920756, 6.4554010393))
            ThreePointArc((-91.5788920756, 6.4554010393), (-91.6968788002, 5.8622417192), (-92.0328765648, 5.3593855285))
        make_face()
        with BuildLine():
            ThreePointArc((23.3946861174, -95.9260415299), (18.2271759416, -97.4066651063), (13.8416706728, -100.5151617091))
            ThreePointArc((13.8416706728, -100.5151617091), (10.73317407, -104.9006669778), (9.2525504936, -110.0681771537))
            ThreePointArc((9.2525504936, -110.0681771537), (9.1713776761, -112.5441996308), (9.4734010854, -115.0030729893))
            ThreePointArc((9.4734010854, -115.0030729893), (26.7504262898, -127.749166207), (41.1553791718, -111.8288702081))
            ThreePointArc((41.1553791718, -111.8288702081), (37.5405969765, -101.6993894746), (28.3295816805, -96.1468920665))
            ThreePointArc((28.3295816805, -96.1468920665), (25.8707084556, -95.8448687061), (23.3946861174, -95.9260415299))
        make_face()
        with BuildLine():
            Line((-80.1669513924, 7.6355959798), (-78.7024852044, 6.1711297919))
            Line((-78.7024852044, 6.1711297919), (-76.6314173926, 6.1711297919))
            ThreePointArc((-76.6314173926, 6.1711297919), (-78.5448346157, 6.5517321547), (-80.1669513924, 7.6355959798))
        make_face()
        with BuildLine():
            Line((-36.8446208282, -33.6156667725), (-36.8446208282, -35.6867345844))
            Line((-36.8446208282, -35.6867345844), (-35.3801547186, -37.151200694))
            ThreePointArc((-35.3801547186, -37.151200694), (-36.4640184865, -35.5290839445), (-36.8446208282, -33.6156667725))
        make_face()
        with BuildLine():
            ThreePointArc((-94.2249075865, 7.5514165502), (-94.2249075865, 5.3593855285), (-92.0328765648, 5.3593855285))
            Line((-92.0328765648, 5.3593855285), (-94.2249075865, 7.5514165502))
        make_face()
        with BuildLine():
            Line((-94.2249075865, 7.5514165502), (-92.0328765648, 5.3593855285))
            ThreePointArc((-92.0328765648, 5.3593855285), (-91.6968788002, 5.8622417192), (-91.5788920756, 6.4554010393))
            ThreePointArc((-91.5788920756, 6.4554010393), (-92.5357327555, 7.8874143147), (-94.2249075865, 7.5514165502))
        make_face()
        with BuildLine():
            Line((18.1551993662, -90.6865547787), (23.3946861174, -95.9260415299))
            ThreePointArc((23.3946861174, -95.9260415299), (25.8707084556, -95.8448687061), (28.3295816805, -96.1468920665))
            ThreePointArc((28.3295816805, -96.1468920665), (22.839753912, -94.1669662375), (18.1551993662, -90.6865547787))
        make_face()
        with BuildLine():
            ThreePointArc((9.4734010854, -115.0030729893), (9.1713776761, -112.5441996308), (9.2525504936, -110.0681771537))
            Line((9.2525504936, -110.0681771537), (4.0130642277, -104.8286908877))
            ThreePointArc((4.0130642277, -104.8286908877), (7.4934754292, -109.5132453732), (9.4734010854, -115.0030729893))
        make_face()
        with BuildLine():
            Line((-49.5222903639, -51.2933362961), (-50.9867564519, -49.8288702081))
            Line((-50.9867564519, -49.8288702081), (-53.0578242638, -49.8288702081))
            ThreePointArc((-53.0578242638, -49.8288702081), (-51.1444071059, -50.2094725439), (-49.5222903639, -51.2933362961))
        make_face()
        with BuildLine():
            Line((-92.8446208282, -10.0420736437), (-92.8446208282, -7.9710058318))
            Line((-92.8446208282, -7.9710058318), (-94.3090869492, -6.5065397108))
            ThreePointArc((-94.3090869492, -6.5065397108), (-93.2252231729, -8.1286564643), (-92.8446208282, -10.0420736437))
        make_face()
        with BuildLine():
            Line((-109.3923480429, 8.5767213829), (-104.4426005746, 3.6269739146))
            Line((-104.4426005746, 3.6269739146), (-102.0030821795, 6.0664923097))
            ThreePointArc((-102.0030821795, 6.0664923097), (-102.0030821795, 8.2585233314), (-99.8110511578, 8.2585233314))
            Line((-99.8110511578, 8.2585233314), (-97.3715327627, 10.6980417265))
            Line((-97.3715327627, 10.6980417265), (-102.3212802311, 15.6477891948))
            Line((-102.3212802311, 15.6477891948), (-109.3923480429, 8.5767213829))
        make_face()
        with BuildLine():
            Line((-92.739983346, 15.3295911432), (-90.3004649509, 17.7691095383))
            Line((-90.3004649509, 17.7691095383), (-95.2502124192, 22.7188570066))
            Line((-95.2502124192, 22.7188570066), (-102.3212802311, 15.6477891948))
            Line((-102.3212802311, 15.6477891948), (-97.3715327627, 10.6980417265))
            Line((-97.3715327627, 10.6980417265), (-94.9320143677, 13.1375601216))
            ThreePointArc((-94.9320143677, 13.1375601216), (-94.9320143677, 15.3295911432), (-92.739983346, 15.3295911432))
        make_face()
        with BuildLine():
            Line((-147.8444409361, 47.0288142761), (-109.3923480429, 8.5767213829))
            Line((-109.3923480429, 8.5767213829), (-102.3212802311, 15.6477891948))
            Line((-102.3212802311, 15.6477891948), (-143.5309123292, 56.8574212929))
            ThreePointArc((-143.5309123292, 56.8574212929), (-147.9164175979, 53.74892469), (-153.0839277737, 52.2683011137))
            Line((-153.0839277737, 52.2683011137), (-147.8444409361, 47.0288142761))
        make_face()
        with BuildLine():
            Line((-102.3212802311, 15.6477891948), (-95.2502124192, 22.7188570066))
            Line((-95.2502124192, 22.7188570066), (-133.7023062703, 61.1709508578))
            Line((-133.7023062703, 61.1709508578), (-138.94179215, 66.4104367374))
            ThreePointArc((-138.94179215, 66.4104367374), (-140.4224157263, 61.2429265616), (-143.5309123292, 56.8574212929))
            Line((-143.5309123292, 56.8574212929), (-102.3212802311, 15.6477891948))
        make_face()
        with BuildLine():
            ThreePointArc((-158.0188232221, 52.4891516271), (-152.528995463, 50.5092257647), (-147.8444409361, 47.0288142761))
            Line((-147.8444409361, 47.0288142761), (-153.0839277737, 52.2683011137))
            ThreePointArc((-153.0839277737, 52.2683011137), (-155.5599500534, 52.1871282873), (-158.0188232221, 52.4891516271))
        make_face()
        with BuildLine():
            Line((-138.94179215, 66.4104367374), (-133.7023062703, 61.1709508578))
            ThreePointArc((-133.7023062703, 61.1709508578), (-137.1827173467, 65.8555054434), (-139.1626428524, 71.3453331199))
            ThreePointArc((-139.1626428524, 71.3453331199), (-138.9243248571, 69.7661771874), (-138.8446208282, 68.1711297919))
            ThreePointArc((-138.8446208282, 68.1711297919), (-138.8689321286, 67.289443581), (-138.94179215, 66.4104367374))
        make_face()
        with BuildLine():
            ThreePointArc((-153.0839277737, 52.2683011137), (-147.9164175979, 53.74892469), (-143.5309123292, 56.8574212929))
            ThreePointArc((-143.5309123292, 56.8574212929), (-140.4224157263, 61.2429265616), (-138.94179215, 66.4104367374))
            ThreePointArc((-138.94179215, 66.4104367374), (-138.8689321286, 67.289443581), (-138.8446208282, 68.1711297919))
            ThreePointArc((-138.8446208282, 68.1711297919), (-138.9243248571, 69.7661771874), (-139.1626428524, 71.3453331199))
            ThreePointArc((-139.1626428524, 71.3453331199), (-166.1583296641, 79.4848379539), (-158.0188232221, 52.4891516271))
            ThreePointArc((-158.0188232221, 52.4891516271), (-155.5599500534, 52.1871282873), (-153.0839277737, 52.2683011137))
        make_face()
    extrude(amount=F1_DEPTH)


solid = Compound([f1.part, f1b.part, f1c.part])
